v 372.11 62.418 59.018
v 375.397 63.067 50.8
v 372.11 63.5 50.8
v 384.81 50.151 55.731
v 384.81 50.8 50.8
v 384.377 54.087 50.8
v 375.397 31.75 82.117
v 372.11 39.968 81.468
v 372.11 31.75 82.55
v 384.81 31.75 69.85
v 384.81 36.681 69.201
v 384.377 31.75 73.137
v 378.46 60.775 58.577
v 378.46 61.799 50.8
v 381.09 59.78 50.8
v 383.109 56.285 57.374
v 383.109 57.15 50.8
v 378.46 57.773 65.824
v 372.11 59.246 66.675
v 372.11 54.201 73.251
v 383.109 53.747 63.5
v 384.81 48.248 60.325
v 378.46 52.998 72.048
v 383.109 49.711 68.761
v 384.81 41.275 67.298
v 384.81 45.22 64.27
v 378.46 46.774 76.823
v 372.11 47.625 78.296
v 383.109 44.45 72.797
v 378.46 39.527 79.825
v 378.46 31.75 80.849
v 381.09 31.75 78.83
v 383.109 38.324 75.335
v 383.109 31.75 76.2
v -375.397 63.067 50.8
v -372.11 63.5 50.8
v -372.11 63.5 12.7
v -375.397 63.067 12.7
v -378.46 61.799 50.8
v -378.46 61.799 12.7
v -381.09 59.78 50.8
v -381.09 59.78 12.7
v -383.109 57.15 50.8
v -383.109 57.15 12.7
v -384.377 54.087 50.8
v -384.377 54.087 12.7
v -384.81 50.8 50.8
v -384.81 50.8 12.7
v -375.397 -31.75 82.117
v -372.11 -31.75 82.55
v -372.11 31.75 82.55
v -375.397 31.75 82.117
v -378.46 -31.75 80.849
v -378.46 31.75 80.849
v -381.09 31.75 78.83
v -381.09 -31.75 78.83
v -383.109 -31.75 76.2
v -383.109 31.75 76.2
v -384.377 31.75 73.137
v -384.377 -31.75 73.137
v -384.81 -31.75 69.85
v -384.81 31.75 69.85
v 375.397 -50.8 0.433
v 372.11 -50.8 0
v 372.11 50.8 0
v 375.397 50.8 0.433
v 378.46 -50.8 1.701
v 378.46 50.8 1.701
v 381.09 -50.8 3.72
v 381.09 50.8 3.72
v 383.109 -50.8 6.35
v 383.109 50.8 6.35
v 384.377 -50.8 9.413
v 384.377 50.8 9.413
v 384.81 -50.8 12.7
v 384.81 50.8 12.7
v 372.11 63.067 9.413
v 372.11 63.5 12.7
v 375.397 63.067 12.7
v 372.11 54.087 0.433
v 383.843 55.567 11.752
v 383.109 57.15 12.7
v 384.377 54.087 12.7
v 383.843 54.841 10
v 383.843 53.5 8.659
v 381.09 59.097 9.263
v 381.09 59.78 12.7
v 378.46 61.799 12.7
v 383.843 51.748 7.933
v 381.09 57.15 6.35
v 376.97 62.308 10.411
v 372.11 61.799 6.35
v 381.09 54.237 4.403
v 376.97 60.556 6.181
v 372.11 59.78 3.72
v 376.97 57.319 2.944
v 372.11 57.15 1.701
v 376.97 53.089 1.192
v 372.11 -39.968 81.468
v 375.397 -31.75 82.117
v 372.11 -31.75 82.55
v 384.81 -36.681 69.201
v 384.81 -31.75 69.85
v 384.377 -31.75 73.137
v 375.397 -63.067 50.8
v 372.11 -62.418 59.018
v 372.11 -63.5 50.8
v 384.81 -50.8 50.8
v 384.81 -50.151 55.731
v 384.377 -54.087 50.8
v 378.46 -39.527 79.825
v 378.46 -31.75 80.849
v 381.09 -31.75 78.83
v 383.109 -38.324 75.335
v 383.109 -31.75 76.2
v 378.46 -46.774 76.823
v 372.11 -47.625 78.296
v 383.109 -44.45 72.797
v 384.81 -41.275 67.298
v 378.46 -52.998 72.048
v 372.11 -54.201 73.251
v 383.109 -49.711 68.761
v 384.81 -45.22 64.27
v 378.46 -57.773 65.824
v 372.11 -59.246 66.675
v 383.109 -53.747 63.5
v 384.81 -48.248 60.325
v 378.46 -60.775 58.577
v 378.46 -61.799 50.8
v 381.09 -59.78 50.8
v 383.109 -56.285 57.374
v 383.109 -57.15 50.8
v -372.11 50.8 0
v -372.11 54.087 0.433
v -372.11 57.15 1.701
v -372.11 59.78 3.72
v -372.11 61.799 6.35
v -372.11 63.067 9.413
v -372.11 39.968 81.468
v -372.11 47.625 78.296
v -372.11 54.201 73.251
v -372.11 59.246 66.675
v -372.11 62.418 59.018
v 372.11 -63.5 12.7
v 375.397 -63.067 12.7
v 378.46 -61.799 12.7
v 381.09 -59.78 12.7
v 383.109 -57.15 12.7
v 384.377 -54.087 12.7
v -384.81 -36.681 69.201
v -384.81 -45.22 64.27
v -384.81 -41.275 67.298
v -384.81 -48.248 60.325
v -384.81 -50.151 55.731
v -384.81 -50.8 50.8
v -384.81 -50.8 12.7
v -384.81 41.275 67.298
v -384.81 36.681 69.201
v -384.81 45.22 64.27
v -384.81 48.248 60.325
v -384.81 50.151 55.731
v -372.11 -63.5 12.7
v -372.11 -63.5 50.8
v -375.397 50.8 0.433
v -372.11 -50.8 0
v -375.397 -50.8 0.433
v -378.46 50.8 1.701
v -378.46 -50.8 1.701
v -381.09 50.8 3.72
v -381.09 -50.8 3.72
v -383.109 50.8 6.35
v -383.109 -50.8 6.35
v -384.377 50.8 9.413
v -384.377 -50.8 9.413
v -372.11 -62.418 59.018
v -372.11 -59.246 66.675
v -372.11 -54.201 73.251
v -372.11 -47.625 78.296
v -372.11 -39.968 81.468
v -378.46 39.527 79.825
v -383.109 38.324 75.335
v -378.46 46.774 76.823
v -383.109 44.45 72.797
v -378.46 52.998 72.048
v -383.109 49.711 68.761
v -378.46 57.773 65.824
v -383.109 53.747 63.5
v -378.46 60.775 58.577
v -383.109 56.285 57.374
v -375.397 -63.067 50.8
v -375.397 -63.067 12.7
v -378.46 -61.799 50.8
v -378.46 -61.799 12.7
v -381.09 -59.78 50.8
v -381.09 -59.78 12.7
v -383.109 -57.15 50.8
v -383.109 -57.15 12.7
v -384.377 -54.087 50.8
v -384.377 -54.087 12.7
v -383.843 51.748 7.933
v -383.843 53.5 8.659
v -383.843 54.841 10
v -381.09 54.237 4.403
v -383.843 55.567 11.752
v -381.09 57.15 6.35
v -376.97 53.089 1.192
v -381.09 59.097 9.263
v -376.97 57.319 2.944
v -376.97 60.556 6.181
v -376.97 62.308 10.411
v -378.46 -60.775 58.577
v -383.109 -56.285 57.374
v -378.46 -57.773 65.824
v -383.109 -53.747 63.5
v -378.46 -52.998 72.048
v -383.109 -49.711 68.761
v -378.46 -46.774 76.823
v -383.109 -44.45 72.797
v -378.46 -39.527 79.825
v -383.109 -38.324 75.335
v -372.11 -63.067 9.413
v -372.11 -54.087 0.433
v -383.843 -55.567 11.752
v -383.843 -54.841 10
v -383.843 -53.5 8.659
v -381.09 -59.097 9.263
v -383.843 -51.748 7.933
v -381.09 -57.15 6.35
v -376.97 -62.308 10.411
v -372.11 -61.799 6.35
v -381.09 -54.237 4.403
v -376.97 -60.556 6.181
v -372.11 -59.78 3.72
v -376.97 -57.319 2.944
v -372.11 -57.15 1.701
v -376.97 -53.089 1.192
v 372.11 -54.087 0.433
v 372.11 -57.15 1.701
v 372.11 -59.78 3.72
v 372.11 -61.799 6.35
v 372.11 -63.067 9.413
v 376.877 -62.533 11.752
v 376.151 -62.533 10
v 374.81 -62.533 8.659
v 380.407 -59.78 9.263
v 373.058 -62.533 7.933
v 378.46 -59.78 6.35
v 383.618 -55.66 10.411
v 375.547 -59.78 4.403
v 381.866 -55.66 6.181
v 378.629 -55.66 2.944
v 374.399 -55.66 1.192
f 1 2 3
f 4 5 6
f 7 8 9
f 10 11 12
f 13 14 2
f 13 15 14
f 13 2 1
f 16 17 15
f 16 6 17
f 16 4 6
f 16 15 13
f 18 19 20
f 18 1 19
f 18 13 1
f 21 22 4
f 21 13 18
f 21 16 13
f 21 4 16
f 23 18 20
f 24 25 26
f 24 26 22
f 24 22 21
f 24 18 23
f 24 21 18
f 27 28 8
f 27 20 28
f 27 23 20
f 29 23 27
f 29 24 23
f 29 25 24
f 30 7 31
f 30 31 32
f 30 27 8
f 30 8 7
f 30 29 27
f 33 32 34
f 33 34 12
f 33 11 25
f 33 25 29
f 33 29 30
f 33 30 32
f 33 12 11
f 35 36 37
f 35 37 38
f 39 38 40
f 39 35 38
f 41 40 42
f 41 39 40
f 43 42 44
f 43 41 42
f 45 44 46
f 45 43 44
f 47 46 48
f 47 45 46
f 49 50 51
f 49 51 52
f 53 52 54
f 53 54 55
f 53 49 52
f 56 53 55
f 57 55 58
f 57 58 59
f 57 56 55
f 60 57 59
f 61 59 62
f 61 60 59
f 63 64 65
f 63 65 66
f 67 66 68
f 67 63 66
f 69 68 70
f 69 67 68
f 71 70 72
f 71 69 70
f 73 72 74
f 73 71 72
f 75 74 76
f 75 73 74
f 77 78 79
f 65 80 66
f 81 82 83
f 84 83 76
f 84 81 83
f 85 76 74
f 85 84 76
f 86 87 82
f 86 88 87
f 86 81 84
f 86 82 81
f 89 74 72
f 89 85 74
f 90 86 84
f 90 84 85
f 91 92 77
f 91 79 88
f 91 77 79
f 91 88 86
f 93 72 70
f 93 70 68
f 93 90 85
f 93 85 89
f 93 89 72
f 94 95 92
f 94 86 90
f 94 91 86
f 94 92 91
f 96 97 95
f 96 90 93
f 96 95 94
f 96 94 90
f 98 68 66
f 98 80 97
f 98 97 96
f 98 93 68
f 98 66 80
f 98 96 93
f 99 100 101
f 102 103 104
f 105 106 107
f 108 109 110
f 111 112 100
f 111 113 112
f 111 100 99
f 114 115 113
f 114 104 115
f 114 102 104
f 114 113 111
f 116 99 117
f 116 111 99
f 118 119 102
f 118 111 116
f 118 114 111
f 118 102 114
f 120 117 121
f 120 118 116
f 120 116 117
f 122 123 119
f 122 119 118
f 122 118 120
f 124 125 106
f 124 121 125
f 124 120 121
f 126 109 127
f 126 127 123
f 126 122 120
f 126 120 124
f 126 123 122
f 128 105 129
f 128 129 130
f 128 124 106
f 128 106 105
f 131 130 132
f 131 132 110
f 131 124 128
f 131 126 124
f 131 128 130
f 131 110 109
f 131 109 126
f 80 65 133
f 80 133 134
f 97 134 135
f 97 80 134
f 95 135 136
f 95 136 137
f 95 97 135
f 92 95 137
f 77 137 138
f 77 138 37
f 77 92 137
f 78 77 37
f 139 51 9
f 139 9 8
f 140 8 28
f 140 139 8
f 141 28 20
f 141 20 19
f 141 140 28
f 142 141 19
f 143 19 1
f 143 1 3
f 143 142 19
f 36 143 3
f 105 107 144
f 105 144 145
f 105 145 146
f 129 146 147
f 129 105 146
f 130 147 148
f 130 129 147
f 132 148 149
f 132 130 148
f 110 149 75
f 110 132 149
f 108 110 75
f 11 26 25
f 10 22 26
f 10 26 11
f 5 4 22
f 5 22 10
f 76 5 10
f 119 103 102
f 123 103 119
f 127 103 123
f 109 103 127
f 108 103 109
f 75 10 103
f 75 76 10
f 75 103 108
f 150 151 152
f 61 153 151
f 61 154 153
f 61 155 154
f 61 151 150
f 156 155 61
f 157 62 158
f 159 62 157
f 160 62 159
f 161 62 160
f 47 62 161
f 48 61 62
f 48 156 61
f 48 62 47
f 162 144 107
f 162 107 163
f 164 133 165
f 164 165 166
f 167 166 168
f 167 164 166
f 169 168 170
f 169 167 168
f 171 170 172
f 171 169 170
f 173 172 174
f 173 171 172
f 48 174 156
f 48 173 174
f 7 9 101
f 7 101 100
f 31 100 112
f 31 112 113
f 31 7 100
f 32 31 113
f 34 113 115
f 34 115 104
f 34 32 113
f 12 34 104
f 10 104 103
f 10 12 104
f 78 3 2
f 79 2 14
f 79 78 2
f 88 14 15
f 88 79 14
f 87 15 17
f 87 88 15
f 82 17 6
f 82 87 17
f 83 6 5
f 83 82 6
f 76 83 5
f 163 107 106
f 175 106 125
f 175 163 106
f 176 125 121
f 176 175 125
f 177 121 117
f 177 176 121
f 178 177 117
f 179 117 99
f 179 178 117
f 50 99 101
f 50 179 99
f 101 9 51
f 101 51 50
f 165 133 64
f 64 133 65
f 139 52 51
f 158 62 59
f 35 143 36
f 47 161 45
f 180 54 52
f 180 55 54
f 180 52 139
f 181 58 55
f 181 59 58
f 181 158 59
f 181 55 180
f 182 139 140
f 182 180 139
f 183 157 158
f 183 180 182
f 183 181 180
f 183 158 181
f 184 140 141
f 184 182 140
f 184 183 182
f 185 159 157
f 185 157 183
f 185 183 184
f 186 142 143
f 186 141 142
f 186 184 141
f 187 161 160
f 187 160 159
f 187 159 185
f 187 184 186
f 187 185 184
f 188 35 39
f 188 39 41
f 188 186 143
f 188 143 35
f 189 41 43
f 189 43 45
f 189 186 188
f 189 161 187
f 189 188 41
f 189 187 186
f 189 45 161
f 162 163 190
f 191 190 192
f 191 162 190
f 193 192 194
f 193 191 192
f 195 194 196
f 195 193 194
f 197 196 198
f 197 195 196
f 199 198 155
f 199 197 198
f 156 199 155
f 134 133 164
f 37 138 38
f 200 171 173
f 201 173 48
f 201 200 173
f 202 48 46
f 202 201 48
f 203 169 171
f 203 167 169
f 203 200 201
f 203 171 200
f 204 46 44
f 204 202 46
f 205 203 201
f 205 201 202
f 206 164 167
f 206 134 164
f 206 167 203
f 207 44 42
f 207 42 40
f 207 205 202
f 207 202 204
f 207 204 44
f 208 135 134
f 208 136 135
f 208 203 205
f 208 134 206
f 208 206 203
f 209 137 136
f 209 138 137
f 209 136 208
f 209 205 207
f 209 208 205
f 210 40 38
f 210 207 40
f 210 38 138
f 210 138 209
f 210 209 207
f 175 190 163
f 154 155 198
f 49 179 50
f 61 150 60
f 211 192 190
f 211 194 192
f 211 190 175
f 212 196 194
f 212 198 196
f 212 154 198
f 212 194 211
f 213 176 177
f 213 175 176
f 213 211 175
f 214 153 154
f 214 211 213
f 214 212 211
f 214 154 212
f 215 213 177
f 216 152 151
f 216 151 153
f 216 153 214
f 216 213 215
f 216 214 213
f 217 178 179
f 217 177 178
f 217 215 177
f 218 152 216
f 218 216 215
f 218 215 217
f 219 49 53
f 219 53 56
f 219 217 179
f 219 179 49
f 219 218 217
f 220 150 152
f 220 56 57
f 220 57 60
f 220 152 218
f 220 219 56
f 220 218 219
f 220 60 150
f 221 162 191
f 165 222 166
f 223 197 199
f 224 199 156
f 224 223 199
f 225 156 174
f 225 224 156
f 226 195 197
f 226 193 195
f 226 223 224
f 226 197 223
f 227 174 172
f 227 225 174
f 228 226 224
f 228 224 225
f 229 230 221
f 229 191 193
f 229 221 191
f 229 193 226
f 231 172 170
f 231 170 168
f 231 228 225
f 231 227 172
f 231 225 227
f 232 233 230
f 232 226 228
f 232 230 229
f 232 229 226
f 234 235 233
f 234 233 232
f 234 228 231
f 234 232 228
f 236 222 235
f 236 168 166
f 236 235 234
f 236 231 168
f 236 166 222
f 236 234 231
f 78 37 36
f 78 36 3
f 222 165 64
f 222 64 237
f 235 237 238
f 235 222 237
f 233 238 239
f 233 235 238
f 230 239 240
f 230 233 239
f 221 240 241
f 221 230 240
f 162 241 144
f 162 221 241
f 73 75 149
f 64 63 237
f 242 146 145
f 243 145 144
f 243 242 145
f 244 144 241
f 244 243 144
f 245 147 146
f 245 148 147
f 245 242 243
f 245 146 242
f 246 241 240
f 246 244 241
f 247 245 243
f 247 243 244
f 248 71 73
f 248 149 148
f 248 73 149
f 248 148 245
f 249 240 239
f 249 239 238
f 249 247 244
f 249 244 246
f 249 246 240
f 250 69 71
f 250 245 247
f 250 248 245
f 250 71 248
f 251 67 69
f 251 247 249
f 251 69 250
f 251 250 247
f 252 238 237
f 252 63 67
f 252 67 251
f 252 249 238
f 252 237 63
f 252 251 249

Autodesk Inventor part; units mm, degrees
ref_plane "YZ Plane" through (0, 0, 0) normal (1, 0, 0) x (0, 1, 0)
ref_plane "XZ Plane" through (0, 0, 0) normal (0, 1, 0) x (-1, 0, 0)
ref_plane "XY Plane" through (0, 0, 0) normal (0, 0, 1) x (1, 0, 0)
sketch "Sketch1" plane through (0, 0, 0) normal (0, 0, 1) x (1, 0, 0)
  line L0 (-384.81, 63.5) -> (384.81, 63.5)
  line L1 (384.81, 63.5) -> (384.81, -63.5)
  line L2 (384.81, -63.5) -> (-384.81, -63.5)
  line L3 (-384.81, -63.5) -> (-384.81, 63.5)
  point P0 (0, 0)
  point P1 (-384.81, 0)
  point P2 (0, 63.5)
  dimension "d0" = 769.62
  dimension "d1" = 127
extrude "Extrusion1" add sketch "Sketch1" along normal blind 19.05
sketch "Sketch2" plane through (0, 0, 0) normal (1, 0, 0) x (0, 1, 0)
  line L0 (63.5, 19.05) -> (63.5, 0) construction
  line L1 (63.5, 0) -> (-63.5, 0) construction
  line L2 (-63.5, 0) -> (-63.5, 19.05) construction
  line L3 (-63.5, 19.05) -> (63.5, 19.05) construction
  circle A0 centre (31.75, 50.8) radius 31.75
  circle A1 centre (-31.75, 50.8) radius 31.75
  point P0 (0, 0)
  dimension "d4" = 63.5
  dimension "d5" = 63.5
extrude "Extrusion2" add sketch "Sketch2" along normal mid plane 769.62
sketch "Sketch3" plane through (384.81, -63.5, 0) normal (1, 0, 0) x (0, 0, -1)
  line L0 (-19.05, 127) -> (0, 127) projected
  line L1 (0, 127) -> (0, 0) projected
  line L2 (0, 0) -> (-19.05, 0) projected
  line L3 (-19.05, 0) -> (-19.05, 31.75) projected
  line L4 (-19.05, 31.75) -> (-19.05, 95.25) projected
  arc A0 (-50.8, 63.5) -> (-19.05, 95.25) centre (-50.8, 95.25) ccw projected
  arc A1 (-50.8, 63.5) -> (-19.05, 31.75) centre (-50.8, 31.75) ccw projected
  arc A2 (-19.05, 31.75) -> (-50.8, 63.5) centre (-50.8, 31.75) ccw projected
  arc A3 (-19.05, 95.25) -> (-50.8, 63.5) centre (-50.8, 95.25) ccw projected
  line L5 (-19.05, 95.25) -> (-19.05, 127) projected
  line L6 (-50.8, 127) -> (-19.05, 127)
  line L7 (-82.55, 95.25) -> (-82.55, 31.75)
  line L8 (-50.8, 0) -> (-19.05, 0)
  point P0 (0, 63.5)
extrude "Extrusion3" add sketch "Sketch3" against normal blind 769.62 contours L5 A3 L6 | L4 A2 A0 | L3 L8 A1 | A1 L7 A3
fillet "Fillet1" radius 12.7 14 edges at (0, 63.5, 0) (384.81, 0, 0) (0, -63.5, 0) (-384.81, 0, 0) (-384.81, 63.5, 25.4) (384.81, 63.5, 25.4) (-384.81, 54.2006, 73.2506) (-384.81, 0, 82.55) (-384.81, -54.2006, 73.2506) (-384.81, -63.5, 25.4) (384.81, 54.2006, 73.2506) (384.81, 0, 82.55) (384.81, -54.2006, 73.2506) (384.81, -63.5, 25.4)
equation "\"d6\" = d0"
equation "\"d8\" = d0"
properties part number "FrontBumpers"
